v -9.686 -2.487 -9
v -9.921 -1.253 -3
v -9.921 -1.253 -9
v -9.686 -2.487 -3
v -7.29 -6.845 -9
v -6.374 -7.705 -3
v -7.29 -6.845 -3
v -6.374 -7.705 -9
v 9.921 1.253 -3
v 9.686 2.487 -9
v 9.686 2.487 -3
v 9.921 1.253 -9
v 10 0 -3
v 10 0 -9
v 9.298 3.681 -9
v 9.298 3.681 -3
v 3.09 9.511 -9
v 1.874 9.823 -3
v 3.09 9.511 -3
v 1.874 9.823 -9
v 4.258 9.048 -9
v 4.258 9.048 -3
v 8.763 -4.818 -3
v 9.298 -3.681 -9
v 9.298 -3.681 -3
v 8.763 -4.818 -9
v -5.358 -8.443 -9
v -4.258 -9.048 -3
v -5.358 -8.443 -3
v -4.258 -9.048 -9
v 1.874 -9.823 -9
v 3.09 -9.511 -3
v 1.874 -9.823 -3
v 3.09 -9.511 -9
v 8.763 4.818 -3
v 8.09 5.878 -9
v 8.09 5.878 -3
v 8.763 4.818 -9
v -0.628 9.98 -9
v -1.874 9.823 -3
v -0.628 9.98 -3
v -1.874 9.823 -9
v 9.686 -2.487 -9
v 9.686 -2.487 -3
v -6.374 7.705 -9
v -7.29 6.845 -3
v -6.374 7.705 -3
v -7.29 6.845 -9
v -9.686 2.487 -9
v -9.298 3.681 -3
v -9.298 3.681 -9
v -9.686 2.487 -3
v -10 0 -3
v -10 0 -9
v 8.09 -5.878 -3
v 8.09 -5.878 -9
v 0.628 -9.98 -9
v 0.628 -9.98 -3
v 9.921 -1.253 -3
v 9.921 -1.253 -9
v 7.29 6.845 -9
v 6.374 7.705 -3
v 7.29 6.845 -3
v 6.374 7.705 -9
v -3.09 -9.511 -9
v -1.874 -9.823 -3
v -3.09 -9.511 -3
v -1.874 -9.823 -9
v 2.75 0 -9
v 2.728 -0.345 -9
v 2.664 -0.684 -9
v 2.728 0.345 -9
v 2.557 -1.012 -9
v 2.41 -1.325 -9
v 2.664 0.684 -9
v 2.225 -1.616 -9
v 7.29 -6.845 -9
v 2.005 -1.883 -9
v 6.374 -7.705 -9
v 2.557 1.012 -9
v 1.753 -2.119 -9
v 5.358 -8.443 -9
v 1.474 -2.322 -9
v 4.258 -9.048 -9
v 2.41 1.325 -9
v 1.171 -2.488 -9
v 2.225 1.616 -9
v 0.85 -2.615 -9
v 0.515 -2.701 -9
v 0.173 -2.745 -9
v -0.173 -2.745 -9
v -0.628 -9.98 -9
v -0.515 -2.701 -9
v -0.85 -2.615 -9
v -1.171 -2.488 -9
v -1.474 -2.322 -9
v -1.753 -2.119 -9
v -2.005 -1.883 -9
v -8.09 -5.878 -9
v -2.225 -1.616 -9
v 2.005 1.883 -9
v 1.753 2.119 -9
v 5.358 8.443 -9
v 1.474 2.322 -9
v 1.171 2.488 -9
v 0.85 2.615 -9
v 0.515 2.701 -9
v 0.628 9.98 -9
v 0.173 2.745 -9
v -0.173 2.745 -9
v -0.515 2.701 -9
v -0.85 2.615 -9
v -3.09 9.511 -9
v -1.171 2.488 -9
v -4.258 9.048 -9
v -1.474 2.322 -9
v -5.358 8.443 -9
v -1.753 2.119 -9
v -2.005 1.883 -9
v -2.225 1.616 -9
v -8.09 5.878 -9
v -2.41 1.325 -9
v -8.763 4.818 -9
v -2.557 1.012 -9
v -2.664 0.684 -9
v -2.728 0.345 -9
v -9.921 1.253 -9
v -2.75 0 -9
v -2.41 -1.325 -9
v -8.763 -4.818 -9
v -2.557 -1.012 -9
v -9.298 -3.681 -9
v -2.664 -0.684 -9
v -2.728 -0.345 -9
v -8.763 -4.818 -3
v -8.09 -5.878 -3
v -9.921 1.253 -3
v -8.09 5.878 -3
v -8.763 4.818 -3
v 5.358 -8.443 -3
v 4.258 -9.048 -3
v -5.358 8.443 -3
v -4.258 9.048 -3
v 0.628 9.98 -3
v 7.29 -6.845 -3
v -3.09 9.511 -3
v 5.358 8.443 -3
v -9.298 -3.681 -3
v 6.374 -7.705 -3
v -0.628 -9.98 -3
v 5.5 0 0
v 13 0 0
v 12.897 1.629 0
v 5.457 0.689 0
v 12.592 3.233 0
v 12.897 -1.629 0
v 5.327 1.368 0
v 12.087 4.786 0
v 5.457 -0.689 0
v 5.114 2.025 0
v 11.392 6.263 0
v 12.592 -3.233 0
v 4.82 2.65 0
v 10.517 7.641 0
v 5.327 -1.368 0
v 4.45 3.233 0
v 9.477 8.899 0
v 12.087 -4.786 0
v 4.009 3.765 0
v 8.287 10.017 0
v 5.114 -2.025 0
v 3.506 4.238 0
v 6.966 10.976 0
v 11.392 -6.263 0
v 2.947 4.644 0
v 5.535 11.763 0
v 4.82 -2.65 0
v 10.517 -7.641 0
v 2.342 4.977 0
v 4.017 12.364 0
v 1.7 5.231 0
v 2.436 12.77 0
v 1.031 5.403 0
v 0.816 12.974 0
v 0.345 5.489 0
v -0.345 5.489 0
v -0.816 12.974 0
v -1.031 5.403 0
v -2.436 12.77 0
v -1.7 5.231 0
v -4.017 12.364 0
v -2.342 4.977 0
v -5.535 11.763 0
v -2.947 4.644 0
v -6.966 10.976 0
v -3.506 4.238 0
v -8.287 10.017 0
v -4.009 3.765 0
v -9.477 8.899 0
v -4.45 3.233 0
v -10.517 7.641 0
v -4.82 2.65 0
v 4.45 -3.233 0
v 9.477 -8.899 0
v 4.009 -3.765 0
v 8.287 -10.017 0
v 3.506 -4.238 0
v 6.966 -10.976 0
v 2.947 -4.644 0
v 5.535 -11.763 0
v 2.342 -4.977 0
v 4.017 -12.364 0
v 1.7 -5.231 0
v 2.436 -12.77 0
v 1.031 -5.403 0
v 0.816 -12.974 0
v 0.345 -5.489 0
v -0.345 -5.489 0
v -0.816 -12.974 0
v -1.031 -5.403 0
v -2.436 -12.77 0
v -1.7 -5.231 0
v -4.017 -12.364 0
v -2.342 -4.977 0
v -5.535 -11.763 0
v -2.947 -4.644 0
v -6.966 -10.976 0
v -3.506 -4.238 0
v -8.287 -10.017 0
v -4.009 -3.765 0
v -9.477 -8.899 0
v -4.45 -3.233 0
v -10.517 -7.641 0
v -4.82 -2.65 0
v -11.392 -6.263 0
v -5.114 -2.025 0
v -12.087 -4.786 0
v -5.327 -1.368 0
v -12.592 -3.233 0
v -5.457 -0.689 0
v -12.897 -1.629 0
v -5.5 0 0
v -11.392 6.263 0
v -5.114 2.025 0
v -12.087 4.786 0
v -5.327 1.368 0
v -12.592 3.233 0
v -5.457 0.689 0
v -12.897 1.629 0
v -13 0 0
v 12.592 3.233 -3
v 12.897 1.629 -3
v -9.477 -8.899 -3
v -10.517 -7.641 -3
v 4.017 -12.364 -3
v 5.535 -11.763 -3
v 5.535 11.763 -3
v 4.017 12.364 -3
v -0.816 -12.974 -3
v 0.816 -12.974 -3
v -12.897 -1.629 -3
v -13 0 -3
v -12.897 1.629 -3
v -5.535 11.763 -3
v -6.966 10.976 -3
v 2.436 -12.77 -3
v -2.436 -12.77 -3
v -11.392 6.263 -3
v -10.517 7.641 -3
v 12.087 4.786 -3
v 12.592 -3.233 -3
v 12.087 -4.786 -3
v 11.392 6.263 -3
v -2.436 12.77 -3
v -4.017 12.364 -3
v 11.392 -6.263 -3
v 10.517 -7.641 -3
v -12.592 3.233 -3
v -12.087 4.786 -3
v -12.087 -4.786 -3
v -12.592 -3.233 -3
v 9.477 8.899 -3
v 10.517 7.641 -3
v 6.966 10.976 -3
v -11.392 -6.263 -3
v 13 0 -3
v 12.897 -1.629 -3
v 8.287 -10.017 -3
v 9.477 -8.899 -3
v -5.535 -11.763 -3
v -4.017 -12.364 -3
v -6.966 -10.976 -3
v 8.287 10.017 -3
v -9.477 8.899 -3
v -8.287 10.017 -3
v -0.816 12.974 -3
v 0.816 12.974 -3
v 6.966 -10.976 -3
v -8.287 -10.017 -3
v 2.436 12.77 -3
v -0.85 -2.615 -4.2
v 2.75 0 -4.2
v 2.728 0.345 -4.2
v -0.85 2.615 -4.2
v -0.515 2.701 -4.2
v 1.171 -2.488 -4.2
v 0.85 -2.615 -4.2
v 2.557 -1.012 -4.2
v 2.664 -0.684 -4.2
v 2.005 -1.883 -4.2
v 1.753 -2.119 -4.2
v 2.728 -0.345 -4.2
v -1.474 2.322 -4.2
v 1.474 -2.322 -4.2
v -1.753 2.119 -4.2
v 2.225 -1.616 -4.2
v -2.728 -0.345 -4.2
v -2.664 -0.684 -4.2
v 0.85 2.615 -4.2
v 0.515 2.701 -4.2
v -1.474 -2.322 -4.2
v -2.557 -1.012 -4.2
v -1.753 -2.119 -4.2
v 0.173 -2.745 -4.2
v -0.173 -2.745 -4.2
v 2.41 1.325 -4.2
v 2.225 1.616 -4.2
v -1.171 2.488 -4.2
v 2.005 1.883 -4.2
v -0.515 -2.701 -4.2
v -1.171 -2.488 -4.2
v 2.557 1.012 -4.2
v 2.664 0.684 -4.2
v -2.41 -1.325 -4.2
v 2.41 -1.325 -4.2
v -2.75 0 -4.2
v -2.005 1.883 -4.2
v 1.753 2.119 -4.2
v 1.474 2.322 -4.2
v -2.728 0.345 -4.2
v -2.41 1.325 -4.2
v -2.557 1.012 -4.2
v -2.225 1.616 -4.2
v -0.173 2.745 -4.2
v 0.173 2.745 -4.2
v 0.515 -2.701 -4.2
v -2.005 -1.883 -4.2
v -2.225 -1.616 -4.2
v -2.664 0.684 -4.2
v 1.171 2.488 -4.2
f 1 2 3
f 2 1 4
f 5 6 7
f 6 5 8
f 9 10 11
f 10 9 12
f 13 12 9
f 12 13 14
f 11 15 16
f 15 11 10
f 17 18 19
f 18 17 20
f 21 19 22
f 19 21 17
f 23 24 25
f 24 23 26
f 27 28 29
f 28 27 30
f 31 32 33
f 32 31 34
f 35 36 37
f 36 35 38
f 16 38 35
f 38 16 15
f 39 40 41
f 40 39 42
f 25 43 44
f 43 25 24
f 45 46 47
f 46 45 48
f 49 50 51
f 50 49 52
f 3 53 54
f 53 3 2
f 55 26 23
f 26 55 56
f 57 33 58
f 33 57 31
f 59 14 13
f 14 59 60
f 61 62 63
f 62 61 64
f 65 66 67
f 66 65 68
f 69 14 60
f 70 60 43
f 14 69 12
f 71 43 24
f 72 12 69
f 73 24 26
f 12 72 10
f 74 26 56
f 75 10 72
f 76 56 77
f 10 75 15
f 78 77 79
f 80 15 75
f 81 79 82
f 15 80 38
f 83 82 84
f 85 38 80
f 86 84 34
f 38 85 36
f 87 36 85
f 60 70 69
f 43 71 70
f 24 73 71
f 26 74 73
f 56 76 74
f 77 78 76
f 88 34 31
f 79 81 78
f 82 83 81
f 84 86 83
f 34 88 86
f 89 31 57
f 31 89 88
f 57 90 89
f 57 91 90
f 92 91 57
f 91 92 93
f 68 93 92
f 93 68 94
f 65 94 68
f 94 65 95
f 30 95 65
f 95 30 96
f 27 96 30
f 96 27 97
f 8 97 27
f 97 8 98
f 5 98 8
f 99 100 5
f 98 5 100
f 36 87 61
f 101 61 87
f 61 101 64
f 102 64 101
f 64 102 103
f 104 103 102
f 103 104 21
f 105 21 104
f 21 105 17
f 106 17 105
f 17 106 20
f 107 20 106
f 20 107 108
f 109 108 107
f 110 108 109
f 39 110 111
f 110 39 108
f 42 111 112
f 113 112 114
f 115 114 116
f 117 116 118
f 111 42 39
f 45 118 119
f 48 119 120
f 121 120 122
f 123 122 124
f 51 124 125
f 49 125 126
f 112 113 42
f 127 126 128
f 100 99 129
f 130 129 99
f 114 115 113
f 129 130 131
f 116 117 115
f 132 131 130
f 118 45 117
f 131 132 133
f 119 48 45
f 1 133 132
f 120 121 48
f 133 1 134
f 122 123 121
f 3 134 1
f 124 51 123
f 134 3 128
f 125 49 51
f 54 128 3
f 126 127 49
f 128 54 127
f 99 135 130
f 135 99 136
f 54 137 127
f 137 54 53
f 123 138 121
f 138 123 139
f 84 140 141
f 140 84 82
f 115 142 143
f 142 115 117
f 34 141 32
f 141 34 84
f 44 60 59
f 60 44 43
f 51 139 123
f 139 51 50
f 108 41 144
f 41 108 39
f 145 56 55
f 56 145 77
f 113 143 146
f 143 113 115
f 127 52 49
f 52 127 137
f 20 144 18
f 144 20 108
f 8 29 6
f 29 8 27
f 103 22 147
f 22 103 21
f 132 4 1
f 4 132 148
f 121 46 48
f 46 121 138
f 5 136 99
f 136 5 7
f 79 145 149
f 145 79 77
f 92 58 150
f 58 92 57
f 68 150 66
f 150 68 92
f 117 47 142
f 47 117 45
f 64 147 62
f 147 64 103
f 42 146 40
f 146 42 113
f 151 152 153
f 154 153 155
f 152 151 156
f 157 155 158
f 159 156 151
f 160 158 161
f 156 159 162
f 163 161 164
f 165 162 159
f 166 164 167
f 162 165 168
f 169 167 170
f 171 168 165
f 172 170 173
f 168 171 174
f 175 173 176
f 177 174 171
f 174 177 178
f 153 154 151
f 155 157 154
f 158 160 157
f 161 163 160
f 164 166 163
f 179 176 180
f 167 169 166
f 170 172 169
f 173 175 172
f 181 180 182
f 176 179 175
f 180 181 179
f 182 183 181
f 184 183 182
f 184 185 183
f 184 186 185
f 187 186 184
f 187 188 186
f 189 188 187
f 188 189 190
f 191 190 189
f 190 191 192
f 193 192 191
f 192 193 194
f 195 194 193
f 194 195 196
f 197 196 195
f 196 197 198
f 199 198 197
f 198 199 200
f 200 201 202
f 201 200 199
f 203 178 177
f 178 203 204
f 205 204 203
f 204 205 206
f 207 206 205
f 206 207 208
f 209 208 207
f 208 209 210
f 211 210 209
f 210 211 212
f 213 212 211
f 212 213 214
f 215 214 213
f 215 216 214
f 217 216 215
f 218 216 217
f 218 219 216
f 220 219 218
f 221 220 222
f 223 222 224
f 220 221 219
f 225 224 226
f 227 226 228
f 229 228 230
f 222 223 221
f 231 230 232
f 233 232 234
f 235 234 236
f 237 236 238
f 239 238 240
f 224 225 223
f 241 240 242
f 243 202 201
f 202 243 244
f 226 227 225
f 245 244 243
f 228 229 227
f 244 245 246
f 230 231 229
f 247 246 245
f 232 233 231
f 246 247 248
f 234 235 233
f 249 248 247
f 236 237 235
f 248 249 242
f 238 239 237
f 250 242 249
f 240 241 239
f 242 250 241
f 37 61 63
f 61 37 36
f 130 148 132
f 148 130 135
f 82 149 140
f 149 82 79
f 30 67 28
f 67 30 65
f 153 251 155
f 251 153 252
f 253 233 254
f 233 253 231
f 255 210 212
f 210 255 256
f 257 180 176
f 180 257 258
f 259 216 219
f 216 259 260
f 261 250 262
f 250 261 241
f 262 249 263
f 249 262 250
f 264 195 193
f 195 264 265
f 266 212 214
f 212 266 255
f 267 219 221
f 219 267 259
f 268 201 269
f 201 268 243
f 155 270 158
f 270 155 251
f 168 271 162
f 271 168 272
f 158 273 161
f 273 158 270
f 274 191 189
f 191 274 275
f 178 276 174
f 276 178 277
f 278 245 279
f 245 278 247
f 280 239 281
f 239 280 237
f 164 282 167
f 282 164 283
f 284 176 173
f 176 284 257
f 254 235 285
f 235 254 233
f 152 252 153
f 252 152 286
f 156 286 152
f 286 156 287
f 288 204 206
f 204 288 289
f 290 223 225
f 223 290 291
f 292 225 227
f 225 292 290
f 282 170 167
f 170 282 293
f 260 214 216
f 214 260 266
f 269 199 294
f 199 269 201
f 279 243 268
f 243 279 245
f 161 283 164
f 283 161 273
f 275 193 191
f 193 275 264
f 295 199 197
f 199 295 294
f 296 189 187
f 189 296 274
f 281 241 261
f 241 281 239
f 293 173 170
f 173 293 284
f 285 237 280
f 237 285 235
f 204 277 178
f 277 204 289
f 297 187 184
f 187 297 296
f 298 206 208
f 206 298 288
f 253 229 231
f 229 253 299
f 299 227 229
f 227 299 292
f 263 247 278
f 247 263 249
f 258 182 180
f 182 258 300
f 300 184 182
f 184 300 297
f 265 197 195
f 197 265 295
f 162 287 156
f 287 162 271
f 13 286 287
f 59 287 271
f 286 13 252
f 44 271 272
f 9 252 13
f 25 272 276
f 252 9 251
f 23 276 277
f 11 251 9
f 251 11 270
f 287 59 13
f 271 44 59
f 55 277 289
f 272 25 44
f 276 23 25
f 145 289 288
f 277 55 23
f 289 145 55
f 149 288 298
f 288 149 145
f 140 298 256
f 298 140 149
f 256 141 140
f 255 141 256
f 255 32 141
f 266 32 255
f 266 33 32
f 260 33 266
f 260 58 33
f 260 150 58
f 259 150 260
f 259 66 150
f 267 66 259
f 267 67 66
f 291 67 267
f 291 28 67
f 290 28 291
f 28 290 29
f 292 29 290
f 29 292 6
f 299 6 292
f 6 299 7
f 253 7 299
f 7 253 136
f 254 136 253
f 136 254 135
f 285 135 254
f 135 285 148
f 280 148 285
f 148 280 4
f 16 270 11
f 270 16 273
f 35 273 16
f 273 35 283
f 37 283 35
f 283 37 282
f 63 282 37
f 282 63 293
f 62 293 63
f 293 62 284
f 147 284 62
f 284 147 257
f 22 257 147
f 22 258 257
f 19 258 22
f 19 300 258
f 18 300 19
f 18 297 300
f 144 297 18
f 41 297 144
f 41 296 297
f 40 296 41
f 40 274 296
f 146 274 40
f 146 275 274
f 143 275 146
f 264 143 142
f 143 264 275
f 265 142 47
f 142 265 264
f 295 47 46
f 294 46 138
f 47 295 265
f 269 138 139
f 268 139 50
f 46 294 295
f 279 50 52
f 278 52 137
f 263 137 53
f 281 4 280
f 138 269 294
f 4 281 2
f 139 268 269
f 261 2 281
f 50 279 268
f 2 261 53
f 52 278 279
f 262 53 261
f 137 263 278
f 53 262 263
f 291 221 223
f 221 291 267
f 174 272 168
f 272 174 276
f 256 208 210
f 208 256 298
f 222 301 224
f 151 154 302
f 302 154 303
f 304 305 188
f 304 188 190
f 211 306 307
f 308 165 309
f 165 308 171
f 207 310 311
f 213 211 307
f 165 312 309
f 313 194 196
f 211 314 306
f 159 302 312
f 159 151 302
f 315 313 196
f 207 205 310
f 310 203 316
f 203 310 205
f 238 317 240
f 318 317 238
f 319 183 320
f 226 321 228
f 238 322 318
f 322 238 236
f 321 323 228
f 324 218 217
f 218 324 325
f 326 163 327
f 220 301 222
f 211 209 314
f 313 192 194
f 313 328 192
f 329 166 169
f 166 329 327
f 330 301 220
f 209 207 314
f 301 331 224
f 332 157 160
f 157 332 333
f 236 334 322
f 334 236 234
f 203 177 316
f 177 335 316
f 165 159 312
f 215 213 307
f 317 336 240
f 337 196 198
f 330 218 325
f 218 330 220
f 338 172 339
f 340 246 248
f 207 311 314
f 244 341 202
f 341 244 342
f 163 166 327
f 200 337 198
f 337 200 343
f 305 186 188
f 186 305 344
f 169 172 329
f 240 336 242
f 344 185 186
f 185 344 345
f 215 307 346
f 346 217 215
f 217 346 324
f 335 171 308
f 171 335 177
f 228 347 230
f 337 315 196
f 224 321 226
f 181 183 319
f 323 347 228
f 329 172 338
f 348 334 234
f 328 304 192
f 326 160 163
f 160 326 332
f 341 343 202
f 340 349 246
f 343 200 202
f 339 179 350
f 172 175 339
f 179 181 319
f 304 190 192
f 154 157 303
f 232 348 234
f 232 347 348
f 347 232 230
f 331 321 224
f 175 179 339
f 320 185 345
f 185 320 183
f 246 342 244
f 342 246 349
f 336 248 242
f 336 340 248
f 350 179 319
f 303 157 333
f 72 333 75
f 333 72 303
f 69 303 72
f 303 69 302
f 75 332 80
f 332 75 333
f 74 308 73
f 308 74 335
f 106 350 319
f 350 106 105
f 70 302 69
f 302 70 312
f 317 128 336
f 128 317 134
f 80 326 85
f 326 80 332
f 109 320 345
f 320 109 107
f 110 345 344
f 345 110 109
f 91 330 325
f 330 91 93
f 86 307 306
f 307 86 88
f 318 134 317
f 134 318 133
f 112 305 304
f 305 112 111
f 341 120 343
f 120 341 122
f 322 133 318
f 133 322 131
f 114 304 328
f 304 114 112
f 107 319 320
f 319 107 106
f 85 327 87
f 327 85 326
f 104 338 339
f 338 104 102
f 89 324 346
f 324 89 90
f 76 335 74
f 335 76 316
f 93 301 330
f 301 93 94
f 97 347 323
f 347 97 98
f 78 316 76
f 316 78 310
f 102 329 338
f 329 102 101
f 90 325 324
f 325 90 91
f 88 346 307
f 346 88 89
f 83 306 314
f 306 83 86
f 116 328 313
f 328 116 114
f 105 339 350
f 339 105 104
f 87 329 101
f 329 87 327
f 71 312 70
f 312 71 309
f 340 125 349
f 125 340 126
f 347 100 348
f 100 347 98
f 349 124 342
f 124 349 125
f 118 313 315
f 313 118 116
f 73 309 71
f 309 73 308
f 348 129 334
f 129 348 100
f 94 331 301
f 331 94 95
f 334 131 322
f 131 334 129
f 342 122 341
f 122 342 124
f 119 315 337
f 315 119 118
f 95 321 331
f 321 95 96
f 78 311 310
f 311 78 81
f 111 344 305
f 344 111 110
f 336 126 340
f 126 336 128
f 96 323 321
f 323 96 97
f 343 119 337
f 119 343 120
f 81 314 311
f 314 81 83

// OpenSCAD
$fn = 50;


difference() {
	union() {
		translate(v = [0, 0, -9.0000000000]) {
			cylinder(h = 9, r = 10.0000000000);
		}
		translate(v = [0, 0, -3.0000000000]) {
			cylinder(h = 3, r = 13.0000000000);
		}
	}
	union() {
		translate(v = [0, 0, 0]) {
			rotate(a = [0, 0, 0]) {
				difference() {
					union() {
						#translate(v = [0, 0, -9.0000000000]) {
							cylinder(h = 9, r = 2.2500000000);
						}
						#translate(v = [0, 0, -4.2000000000]) {
							cylinder(h = 4.2000000000, r = 10.0000000000, r1 = 2.7500000000, r2 = 5.5000000000);
						}
						#translate(v = [0, 0, -9.0000000000]) {
							cylinder(h = 9, r = 2.7500000000);
						}
						#translate(v = [0, 0, -9.0000000000]) {
							cylinder(h = 9, r = 2.2500000000);
						}
					}
					union();
				}
			}
		}
	}
}
